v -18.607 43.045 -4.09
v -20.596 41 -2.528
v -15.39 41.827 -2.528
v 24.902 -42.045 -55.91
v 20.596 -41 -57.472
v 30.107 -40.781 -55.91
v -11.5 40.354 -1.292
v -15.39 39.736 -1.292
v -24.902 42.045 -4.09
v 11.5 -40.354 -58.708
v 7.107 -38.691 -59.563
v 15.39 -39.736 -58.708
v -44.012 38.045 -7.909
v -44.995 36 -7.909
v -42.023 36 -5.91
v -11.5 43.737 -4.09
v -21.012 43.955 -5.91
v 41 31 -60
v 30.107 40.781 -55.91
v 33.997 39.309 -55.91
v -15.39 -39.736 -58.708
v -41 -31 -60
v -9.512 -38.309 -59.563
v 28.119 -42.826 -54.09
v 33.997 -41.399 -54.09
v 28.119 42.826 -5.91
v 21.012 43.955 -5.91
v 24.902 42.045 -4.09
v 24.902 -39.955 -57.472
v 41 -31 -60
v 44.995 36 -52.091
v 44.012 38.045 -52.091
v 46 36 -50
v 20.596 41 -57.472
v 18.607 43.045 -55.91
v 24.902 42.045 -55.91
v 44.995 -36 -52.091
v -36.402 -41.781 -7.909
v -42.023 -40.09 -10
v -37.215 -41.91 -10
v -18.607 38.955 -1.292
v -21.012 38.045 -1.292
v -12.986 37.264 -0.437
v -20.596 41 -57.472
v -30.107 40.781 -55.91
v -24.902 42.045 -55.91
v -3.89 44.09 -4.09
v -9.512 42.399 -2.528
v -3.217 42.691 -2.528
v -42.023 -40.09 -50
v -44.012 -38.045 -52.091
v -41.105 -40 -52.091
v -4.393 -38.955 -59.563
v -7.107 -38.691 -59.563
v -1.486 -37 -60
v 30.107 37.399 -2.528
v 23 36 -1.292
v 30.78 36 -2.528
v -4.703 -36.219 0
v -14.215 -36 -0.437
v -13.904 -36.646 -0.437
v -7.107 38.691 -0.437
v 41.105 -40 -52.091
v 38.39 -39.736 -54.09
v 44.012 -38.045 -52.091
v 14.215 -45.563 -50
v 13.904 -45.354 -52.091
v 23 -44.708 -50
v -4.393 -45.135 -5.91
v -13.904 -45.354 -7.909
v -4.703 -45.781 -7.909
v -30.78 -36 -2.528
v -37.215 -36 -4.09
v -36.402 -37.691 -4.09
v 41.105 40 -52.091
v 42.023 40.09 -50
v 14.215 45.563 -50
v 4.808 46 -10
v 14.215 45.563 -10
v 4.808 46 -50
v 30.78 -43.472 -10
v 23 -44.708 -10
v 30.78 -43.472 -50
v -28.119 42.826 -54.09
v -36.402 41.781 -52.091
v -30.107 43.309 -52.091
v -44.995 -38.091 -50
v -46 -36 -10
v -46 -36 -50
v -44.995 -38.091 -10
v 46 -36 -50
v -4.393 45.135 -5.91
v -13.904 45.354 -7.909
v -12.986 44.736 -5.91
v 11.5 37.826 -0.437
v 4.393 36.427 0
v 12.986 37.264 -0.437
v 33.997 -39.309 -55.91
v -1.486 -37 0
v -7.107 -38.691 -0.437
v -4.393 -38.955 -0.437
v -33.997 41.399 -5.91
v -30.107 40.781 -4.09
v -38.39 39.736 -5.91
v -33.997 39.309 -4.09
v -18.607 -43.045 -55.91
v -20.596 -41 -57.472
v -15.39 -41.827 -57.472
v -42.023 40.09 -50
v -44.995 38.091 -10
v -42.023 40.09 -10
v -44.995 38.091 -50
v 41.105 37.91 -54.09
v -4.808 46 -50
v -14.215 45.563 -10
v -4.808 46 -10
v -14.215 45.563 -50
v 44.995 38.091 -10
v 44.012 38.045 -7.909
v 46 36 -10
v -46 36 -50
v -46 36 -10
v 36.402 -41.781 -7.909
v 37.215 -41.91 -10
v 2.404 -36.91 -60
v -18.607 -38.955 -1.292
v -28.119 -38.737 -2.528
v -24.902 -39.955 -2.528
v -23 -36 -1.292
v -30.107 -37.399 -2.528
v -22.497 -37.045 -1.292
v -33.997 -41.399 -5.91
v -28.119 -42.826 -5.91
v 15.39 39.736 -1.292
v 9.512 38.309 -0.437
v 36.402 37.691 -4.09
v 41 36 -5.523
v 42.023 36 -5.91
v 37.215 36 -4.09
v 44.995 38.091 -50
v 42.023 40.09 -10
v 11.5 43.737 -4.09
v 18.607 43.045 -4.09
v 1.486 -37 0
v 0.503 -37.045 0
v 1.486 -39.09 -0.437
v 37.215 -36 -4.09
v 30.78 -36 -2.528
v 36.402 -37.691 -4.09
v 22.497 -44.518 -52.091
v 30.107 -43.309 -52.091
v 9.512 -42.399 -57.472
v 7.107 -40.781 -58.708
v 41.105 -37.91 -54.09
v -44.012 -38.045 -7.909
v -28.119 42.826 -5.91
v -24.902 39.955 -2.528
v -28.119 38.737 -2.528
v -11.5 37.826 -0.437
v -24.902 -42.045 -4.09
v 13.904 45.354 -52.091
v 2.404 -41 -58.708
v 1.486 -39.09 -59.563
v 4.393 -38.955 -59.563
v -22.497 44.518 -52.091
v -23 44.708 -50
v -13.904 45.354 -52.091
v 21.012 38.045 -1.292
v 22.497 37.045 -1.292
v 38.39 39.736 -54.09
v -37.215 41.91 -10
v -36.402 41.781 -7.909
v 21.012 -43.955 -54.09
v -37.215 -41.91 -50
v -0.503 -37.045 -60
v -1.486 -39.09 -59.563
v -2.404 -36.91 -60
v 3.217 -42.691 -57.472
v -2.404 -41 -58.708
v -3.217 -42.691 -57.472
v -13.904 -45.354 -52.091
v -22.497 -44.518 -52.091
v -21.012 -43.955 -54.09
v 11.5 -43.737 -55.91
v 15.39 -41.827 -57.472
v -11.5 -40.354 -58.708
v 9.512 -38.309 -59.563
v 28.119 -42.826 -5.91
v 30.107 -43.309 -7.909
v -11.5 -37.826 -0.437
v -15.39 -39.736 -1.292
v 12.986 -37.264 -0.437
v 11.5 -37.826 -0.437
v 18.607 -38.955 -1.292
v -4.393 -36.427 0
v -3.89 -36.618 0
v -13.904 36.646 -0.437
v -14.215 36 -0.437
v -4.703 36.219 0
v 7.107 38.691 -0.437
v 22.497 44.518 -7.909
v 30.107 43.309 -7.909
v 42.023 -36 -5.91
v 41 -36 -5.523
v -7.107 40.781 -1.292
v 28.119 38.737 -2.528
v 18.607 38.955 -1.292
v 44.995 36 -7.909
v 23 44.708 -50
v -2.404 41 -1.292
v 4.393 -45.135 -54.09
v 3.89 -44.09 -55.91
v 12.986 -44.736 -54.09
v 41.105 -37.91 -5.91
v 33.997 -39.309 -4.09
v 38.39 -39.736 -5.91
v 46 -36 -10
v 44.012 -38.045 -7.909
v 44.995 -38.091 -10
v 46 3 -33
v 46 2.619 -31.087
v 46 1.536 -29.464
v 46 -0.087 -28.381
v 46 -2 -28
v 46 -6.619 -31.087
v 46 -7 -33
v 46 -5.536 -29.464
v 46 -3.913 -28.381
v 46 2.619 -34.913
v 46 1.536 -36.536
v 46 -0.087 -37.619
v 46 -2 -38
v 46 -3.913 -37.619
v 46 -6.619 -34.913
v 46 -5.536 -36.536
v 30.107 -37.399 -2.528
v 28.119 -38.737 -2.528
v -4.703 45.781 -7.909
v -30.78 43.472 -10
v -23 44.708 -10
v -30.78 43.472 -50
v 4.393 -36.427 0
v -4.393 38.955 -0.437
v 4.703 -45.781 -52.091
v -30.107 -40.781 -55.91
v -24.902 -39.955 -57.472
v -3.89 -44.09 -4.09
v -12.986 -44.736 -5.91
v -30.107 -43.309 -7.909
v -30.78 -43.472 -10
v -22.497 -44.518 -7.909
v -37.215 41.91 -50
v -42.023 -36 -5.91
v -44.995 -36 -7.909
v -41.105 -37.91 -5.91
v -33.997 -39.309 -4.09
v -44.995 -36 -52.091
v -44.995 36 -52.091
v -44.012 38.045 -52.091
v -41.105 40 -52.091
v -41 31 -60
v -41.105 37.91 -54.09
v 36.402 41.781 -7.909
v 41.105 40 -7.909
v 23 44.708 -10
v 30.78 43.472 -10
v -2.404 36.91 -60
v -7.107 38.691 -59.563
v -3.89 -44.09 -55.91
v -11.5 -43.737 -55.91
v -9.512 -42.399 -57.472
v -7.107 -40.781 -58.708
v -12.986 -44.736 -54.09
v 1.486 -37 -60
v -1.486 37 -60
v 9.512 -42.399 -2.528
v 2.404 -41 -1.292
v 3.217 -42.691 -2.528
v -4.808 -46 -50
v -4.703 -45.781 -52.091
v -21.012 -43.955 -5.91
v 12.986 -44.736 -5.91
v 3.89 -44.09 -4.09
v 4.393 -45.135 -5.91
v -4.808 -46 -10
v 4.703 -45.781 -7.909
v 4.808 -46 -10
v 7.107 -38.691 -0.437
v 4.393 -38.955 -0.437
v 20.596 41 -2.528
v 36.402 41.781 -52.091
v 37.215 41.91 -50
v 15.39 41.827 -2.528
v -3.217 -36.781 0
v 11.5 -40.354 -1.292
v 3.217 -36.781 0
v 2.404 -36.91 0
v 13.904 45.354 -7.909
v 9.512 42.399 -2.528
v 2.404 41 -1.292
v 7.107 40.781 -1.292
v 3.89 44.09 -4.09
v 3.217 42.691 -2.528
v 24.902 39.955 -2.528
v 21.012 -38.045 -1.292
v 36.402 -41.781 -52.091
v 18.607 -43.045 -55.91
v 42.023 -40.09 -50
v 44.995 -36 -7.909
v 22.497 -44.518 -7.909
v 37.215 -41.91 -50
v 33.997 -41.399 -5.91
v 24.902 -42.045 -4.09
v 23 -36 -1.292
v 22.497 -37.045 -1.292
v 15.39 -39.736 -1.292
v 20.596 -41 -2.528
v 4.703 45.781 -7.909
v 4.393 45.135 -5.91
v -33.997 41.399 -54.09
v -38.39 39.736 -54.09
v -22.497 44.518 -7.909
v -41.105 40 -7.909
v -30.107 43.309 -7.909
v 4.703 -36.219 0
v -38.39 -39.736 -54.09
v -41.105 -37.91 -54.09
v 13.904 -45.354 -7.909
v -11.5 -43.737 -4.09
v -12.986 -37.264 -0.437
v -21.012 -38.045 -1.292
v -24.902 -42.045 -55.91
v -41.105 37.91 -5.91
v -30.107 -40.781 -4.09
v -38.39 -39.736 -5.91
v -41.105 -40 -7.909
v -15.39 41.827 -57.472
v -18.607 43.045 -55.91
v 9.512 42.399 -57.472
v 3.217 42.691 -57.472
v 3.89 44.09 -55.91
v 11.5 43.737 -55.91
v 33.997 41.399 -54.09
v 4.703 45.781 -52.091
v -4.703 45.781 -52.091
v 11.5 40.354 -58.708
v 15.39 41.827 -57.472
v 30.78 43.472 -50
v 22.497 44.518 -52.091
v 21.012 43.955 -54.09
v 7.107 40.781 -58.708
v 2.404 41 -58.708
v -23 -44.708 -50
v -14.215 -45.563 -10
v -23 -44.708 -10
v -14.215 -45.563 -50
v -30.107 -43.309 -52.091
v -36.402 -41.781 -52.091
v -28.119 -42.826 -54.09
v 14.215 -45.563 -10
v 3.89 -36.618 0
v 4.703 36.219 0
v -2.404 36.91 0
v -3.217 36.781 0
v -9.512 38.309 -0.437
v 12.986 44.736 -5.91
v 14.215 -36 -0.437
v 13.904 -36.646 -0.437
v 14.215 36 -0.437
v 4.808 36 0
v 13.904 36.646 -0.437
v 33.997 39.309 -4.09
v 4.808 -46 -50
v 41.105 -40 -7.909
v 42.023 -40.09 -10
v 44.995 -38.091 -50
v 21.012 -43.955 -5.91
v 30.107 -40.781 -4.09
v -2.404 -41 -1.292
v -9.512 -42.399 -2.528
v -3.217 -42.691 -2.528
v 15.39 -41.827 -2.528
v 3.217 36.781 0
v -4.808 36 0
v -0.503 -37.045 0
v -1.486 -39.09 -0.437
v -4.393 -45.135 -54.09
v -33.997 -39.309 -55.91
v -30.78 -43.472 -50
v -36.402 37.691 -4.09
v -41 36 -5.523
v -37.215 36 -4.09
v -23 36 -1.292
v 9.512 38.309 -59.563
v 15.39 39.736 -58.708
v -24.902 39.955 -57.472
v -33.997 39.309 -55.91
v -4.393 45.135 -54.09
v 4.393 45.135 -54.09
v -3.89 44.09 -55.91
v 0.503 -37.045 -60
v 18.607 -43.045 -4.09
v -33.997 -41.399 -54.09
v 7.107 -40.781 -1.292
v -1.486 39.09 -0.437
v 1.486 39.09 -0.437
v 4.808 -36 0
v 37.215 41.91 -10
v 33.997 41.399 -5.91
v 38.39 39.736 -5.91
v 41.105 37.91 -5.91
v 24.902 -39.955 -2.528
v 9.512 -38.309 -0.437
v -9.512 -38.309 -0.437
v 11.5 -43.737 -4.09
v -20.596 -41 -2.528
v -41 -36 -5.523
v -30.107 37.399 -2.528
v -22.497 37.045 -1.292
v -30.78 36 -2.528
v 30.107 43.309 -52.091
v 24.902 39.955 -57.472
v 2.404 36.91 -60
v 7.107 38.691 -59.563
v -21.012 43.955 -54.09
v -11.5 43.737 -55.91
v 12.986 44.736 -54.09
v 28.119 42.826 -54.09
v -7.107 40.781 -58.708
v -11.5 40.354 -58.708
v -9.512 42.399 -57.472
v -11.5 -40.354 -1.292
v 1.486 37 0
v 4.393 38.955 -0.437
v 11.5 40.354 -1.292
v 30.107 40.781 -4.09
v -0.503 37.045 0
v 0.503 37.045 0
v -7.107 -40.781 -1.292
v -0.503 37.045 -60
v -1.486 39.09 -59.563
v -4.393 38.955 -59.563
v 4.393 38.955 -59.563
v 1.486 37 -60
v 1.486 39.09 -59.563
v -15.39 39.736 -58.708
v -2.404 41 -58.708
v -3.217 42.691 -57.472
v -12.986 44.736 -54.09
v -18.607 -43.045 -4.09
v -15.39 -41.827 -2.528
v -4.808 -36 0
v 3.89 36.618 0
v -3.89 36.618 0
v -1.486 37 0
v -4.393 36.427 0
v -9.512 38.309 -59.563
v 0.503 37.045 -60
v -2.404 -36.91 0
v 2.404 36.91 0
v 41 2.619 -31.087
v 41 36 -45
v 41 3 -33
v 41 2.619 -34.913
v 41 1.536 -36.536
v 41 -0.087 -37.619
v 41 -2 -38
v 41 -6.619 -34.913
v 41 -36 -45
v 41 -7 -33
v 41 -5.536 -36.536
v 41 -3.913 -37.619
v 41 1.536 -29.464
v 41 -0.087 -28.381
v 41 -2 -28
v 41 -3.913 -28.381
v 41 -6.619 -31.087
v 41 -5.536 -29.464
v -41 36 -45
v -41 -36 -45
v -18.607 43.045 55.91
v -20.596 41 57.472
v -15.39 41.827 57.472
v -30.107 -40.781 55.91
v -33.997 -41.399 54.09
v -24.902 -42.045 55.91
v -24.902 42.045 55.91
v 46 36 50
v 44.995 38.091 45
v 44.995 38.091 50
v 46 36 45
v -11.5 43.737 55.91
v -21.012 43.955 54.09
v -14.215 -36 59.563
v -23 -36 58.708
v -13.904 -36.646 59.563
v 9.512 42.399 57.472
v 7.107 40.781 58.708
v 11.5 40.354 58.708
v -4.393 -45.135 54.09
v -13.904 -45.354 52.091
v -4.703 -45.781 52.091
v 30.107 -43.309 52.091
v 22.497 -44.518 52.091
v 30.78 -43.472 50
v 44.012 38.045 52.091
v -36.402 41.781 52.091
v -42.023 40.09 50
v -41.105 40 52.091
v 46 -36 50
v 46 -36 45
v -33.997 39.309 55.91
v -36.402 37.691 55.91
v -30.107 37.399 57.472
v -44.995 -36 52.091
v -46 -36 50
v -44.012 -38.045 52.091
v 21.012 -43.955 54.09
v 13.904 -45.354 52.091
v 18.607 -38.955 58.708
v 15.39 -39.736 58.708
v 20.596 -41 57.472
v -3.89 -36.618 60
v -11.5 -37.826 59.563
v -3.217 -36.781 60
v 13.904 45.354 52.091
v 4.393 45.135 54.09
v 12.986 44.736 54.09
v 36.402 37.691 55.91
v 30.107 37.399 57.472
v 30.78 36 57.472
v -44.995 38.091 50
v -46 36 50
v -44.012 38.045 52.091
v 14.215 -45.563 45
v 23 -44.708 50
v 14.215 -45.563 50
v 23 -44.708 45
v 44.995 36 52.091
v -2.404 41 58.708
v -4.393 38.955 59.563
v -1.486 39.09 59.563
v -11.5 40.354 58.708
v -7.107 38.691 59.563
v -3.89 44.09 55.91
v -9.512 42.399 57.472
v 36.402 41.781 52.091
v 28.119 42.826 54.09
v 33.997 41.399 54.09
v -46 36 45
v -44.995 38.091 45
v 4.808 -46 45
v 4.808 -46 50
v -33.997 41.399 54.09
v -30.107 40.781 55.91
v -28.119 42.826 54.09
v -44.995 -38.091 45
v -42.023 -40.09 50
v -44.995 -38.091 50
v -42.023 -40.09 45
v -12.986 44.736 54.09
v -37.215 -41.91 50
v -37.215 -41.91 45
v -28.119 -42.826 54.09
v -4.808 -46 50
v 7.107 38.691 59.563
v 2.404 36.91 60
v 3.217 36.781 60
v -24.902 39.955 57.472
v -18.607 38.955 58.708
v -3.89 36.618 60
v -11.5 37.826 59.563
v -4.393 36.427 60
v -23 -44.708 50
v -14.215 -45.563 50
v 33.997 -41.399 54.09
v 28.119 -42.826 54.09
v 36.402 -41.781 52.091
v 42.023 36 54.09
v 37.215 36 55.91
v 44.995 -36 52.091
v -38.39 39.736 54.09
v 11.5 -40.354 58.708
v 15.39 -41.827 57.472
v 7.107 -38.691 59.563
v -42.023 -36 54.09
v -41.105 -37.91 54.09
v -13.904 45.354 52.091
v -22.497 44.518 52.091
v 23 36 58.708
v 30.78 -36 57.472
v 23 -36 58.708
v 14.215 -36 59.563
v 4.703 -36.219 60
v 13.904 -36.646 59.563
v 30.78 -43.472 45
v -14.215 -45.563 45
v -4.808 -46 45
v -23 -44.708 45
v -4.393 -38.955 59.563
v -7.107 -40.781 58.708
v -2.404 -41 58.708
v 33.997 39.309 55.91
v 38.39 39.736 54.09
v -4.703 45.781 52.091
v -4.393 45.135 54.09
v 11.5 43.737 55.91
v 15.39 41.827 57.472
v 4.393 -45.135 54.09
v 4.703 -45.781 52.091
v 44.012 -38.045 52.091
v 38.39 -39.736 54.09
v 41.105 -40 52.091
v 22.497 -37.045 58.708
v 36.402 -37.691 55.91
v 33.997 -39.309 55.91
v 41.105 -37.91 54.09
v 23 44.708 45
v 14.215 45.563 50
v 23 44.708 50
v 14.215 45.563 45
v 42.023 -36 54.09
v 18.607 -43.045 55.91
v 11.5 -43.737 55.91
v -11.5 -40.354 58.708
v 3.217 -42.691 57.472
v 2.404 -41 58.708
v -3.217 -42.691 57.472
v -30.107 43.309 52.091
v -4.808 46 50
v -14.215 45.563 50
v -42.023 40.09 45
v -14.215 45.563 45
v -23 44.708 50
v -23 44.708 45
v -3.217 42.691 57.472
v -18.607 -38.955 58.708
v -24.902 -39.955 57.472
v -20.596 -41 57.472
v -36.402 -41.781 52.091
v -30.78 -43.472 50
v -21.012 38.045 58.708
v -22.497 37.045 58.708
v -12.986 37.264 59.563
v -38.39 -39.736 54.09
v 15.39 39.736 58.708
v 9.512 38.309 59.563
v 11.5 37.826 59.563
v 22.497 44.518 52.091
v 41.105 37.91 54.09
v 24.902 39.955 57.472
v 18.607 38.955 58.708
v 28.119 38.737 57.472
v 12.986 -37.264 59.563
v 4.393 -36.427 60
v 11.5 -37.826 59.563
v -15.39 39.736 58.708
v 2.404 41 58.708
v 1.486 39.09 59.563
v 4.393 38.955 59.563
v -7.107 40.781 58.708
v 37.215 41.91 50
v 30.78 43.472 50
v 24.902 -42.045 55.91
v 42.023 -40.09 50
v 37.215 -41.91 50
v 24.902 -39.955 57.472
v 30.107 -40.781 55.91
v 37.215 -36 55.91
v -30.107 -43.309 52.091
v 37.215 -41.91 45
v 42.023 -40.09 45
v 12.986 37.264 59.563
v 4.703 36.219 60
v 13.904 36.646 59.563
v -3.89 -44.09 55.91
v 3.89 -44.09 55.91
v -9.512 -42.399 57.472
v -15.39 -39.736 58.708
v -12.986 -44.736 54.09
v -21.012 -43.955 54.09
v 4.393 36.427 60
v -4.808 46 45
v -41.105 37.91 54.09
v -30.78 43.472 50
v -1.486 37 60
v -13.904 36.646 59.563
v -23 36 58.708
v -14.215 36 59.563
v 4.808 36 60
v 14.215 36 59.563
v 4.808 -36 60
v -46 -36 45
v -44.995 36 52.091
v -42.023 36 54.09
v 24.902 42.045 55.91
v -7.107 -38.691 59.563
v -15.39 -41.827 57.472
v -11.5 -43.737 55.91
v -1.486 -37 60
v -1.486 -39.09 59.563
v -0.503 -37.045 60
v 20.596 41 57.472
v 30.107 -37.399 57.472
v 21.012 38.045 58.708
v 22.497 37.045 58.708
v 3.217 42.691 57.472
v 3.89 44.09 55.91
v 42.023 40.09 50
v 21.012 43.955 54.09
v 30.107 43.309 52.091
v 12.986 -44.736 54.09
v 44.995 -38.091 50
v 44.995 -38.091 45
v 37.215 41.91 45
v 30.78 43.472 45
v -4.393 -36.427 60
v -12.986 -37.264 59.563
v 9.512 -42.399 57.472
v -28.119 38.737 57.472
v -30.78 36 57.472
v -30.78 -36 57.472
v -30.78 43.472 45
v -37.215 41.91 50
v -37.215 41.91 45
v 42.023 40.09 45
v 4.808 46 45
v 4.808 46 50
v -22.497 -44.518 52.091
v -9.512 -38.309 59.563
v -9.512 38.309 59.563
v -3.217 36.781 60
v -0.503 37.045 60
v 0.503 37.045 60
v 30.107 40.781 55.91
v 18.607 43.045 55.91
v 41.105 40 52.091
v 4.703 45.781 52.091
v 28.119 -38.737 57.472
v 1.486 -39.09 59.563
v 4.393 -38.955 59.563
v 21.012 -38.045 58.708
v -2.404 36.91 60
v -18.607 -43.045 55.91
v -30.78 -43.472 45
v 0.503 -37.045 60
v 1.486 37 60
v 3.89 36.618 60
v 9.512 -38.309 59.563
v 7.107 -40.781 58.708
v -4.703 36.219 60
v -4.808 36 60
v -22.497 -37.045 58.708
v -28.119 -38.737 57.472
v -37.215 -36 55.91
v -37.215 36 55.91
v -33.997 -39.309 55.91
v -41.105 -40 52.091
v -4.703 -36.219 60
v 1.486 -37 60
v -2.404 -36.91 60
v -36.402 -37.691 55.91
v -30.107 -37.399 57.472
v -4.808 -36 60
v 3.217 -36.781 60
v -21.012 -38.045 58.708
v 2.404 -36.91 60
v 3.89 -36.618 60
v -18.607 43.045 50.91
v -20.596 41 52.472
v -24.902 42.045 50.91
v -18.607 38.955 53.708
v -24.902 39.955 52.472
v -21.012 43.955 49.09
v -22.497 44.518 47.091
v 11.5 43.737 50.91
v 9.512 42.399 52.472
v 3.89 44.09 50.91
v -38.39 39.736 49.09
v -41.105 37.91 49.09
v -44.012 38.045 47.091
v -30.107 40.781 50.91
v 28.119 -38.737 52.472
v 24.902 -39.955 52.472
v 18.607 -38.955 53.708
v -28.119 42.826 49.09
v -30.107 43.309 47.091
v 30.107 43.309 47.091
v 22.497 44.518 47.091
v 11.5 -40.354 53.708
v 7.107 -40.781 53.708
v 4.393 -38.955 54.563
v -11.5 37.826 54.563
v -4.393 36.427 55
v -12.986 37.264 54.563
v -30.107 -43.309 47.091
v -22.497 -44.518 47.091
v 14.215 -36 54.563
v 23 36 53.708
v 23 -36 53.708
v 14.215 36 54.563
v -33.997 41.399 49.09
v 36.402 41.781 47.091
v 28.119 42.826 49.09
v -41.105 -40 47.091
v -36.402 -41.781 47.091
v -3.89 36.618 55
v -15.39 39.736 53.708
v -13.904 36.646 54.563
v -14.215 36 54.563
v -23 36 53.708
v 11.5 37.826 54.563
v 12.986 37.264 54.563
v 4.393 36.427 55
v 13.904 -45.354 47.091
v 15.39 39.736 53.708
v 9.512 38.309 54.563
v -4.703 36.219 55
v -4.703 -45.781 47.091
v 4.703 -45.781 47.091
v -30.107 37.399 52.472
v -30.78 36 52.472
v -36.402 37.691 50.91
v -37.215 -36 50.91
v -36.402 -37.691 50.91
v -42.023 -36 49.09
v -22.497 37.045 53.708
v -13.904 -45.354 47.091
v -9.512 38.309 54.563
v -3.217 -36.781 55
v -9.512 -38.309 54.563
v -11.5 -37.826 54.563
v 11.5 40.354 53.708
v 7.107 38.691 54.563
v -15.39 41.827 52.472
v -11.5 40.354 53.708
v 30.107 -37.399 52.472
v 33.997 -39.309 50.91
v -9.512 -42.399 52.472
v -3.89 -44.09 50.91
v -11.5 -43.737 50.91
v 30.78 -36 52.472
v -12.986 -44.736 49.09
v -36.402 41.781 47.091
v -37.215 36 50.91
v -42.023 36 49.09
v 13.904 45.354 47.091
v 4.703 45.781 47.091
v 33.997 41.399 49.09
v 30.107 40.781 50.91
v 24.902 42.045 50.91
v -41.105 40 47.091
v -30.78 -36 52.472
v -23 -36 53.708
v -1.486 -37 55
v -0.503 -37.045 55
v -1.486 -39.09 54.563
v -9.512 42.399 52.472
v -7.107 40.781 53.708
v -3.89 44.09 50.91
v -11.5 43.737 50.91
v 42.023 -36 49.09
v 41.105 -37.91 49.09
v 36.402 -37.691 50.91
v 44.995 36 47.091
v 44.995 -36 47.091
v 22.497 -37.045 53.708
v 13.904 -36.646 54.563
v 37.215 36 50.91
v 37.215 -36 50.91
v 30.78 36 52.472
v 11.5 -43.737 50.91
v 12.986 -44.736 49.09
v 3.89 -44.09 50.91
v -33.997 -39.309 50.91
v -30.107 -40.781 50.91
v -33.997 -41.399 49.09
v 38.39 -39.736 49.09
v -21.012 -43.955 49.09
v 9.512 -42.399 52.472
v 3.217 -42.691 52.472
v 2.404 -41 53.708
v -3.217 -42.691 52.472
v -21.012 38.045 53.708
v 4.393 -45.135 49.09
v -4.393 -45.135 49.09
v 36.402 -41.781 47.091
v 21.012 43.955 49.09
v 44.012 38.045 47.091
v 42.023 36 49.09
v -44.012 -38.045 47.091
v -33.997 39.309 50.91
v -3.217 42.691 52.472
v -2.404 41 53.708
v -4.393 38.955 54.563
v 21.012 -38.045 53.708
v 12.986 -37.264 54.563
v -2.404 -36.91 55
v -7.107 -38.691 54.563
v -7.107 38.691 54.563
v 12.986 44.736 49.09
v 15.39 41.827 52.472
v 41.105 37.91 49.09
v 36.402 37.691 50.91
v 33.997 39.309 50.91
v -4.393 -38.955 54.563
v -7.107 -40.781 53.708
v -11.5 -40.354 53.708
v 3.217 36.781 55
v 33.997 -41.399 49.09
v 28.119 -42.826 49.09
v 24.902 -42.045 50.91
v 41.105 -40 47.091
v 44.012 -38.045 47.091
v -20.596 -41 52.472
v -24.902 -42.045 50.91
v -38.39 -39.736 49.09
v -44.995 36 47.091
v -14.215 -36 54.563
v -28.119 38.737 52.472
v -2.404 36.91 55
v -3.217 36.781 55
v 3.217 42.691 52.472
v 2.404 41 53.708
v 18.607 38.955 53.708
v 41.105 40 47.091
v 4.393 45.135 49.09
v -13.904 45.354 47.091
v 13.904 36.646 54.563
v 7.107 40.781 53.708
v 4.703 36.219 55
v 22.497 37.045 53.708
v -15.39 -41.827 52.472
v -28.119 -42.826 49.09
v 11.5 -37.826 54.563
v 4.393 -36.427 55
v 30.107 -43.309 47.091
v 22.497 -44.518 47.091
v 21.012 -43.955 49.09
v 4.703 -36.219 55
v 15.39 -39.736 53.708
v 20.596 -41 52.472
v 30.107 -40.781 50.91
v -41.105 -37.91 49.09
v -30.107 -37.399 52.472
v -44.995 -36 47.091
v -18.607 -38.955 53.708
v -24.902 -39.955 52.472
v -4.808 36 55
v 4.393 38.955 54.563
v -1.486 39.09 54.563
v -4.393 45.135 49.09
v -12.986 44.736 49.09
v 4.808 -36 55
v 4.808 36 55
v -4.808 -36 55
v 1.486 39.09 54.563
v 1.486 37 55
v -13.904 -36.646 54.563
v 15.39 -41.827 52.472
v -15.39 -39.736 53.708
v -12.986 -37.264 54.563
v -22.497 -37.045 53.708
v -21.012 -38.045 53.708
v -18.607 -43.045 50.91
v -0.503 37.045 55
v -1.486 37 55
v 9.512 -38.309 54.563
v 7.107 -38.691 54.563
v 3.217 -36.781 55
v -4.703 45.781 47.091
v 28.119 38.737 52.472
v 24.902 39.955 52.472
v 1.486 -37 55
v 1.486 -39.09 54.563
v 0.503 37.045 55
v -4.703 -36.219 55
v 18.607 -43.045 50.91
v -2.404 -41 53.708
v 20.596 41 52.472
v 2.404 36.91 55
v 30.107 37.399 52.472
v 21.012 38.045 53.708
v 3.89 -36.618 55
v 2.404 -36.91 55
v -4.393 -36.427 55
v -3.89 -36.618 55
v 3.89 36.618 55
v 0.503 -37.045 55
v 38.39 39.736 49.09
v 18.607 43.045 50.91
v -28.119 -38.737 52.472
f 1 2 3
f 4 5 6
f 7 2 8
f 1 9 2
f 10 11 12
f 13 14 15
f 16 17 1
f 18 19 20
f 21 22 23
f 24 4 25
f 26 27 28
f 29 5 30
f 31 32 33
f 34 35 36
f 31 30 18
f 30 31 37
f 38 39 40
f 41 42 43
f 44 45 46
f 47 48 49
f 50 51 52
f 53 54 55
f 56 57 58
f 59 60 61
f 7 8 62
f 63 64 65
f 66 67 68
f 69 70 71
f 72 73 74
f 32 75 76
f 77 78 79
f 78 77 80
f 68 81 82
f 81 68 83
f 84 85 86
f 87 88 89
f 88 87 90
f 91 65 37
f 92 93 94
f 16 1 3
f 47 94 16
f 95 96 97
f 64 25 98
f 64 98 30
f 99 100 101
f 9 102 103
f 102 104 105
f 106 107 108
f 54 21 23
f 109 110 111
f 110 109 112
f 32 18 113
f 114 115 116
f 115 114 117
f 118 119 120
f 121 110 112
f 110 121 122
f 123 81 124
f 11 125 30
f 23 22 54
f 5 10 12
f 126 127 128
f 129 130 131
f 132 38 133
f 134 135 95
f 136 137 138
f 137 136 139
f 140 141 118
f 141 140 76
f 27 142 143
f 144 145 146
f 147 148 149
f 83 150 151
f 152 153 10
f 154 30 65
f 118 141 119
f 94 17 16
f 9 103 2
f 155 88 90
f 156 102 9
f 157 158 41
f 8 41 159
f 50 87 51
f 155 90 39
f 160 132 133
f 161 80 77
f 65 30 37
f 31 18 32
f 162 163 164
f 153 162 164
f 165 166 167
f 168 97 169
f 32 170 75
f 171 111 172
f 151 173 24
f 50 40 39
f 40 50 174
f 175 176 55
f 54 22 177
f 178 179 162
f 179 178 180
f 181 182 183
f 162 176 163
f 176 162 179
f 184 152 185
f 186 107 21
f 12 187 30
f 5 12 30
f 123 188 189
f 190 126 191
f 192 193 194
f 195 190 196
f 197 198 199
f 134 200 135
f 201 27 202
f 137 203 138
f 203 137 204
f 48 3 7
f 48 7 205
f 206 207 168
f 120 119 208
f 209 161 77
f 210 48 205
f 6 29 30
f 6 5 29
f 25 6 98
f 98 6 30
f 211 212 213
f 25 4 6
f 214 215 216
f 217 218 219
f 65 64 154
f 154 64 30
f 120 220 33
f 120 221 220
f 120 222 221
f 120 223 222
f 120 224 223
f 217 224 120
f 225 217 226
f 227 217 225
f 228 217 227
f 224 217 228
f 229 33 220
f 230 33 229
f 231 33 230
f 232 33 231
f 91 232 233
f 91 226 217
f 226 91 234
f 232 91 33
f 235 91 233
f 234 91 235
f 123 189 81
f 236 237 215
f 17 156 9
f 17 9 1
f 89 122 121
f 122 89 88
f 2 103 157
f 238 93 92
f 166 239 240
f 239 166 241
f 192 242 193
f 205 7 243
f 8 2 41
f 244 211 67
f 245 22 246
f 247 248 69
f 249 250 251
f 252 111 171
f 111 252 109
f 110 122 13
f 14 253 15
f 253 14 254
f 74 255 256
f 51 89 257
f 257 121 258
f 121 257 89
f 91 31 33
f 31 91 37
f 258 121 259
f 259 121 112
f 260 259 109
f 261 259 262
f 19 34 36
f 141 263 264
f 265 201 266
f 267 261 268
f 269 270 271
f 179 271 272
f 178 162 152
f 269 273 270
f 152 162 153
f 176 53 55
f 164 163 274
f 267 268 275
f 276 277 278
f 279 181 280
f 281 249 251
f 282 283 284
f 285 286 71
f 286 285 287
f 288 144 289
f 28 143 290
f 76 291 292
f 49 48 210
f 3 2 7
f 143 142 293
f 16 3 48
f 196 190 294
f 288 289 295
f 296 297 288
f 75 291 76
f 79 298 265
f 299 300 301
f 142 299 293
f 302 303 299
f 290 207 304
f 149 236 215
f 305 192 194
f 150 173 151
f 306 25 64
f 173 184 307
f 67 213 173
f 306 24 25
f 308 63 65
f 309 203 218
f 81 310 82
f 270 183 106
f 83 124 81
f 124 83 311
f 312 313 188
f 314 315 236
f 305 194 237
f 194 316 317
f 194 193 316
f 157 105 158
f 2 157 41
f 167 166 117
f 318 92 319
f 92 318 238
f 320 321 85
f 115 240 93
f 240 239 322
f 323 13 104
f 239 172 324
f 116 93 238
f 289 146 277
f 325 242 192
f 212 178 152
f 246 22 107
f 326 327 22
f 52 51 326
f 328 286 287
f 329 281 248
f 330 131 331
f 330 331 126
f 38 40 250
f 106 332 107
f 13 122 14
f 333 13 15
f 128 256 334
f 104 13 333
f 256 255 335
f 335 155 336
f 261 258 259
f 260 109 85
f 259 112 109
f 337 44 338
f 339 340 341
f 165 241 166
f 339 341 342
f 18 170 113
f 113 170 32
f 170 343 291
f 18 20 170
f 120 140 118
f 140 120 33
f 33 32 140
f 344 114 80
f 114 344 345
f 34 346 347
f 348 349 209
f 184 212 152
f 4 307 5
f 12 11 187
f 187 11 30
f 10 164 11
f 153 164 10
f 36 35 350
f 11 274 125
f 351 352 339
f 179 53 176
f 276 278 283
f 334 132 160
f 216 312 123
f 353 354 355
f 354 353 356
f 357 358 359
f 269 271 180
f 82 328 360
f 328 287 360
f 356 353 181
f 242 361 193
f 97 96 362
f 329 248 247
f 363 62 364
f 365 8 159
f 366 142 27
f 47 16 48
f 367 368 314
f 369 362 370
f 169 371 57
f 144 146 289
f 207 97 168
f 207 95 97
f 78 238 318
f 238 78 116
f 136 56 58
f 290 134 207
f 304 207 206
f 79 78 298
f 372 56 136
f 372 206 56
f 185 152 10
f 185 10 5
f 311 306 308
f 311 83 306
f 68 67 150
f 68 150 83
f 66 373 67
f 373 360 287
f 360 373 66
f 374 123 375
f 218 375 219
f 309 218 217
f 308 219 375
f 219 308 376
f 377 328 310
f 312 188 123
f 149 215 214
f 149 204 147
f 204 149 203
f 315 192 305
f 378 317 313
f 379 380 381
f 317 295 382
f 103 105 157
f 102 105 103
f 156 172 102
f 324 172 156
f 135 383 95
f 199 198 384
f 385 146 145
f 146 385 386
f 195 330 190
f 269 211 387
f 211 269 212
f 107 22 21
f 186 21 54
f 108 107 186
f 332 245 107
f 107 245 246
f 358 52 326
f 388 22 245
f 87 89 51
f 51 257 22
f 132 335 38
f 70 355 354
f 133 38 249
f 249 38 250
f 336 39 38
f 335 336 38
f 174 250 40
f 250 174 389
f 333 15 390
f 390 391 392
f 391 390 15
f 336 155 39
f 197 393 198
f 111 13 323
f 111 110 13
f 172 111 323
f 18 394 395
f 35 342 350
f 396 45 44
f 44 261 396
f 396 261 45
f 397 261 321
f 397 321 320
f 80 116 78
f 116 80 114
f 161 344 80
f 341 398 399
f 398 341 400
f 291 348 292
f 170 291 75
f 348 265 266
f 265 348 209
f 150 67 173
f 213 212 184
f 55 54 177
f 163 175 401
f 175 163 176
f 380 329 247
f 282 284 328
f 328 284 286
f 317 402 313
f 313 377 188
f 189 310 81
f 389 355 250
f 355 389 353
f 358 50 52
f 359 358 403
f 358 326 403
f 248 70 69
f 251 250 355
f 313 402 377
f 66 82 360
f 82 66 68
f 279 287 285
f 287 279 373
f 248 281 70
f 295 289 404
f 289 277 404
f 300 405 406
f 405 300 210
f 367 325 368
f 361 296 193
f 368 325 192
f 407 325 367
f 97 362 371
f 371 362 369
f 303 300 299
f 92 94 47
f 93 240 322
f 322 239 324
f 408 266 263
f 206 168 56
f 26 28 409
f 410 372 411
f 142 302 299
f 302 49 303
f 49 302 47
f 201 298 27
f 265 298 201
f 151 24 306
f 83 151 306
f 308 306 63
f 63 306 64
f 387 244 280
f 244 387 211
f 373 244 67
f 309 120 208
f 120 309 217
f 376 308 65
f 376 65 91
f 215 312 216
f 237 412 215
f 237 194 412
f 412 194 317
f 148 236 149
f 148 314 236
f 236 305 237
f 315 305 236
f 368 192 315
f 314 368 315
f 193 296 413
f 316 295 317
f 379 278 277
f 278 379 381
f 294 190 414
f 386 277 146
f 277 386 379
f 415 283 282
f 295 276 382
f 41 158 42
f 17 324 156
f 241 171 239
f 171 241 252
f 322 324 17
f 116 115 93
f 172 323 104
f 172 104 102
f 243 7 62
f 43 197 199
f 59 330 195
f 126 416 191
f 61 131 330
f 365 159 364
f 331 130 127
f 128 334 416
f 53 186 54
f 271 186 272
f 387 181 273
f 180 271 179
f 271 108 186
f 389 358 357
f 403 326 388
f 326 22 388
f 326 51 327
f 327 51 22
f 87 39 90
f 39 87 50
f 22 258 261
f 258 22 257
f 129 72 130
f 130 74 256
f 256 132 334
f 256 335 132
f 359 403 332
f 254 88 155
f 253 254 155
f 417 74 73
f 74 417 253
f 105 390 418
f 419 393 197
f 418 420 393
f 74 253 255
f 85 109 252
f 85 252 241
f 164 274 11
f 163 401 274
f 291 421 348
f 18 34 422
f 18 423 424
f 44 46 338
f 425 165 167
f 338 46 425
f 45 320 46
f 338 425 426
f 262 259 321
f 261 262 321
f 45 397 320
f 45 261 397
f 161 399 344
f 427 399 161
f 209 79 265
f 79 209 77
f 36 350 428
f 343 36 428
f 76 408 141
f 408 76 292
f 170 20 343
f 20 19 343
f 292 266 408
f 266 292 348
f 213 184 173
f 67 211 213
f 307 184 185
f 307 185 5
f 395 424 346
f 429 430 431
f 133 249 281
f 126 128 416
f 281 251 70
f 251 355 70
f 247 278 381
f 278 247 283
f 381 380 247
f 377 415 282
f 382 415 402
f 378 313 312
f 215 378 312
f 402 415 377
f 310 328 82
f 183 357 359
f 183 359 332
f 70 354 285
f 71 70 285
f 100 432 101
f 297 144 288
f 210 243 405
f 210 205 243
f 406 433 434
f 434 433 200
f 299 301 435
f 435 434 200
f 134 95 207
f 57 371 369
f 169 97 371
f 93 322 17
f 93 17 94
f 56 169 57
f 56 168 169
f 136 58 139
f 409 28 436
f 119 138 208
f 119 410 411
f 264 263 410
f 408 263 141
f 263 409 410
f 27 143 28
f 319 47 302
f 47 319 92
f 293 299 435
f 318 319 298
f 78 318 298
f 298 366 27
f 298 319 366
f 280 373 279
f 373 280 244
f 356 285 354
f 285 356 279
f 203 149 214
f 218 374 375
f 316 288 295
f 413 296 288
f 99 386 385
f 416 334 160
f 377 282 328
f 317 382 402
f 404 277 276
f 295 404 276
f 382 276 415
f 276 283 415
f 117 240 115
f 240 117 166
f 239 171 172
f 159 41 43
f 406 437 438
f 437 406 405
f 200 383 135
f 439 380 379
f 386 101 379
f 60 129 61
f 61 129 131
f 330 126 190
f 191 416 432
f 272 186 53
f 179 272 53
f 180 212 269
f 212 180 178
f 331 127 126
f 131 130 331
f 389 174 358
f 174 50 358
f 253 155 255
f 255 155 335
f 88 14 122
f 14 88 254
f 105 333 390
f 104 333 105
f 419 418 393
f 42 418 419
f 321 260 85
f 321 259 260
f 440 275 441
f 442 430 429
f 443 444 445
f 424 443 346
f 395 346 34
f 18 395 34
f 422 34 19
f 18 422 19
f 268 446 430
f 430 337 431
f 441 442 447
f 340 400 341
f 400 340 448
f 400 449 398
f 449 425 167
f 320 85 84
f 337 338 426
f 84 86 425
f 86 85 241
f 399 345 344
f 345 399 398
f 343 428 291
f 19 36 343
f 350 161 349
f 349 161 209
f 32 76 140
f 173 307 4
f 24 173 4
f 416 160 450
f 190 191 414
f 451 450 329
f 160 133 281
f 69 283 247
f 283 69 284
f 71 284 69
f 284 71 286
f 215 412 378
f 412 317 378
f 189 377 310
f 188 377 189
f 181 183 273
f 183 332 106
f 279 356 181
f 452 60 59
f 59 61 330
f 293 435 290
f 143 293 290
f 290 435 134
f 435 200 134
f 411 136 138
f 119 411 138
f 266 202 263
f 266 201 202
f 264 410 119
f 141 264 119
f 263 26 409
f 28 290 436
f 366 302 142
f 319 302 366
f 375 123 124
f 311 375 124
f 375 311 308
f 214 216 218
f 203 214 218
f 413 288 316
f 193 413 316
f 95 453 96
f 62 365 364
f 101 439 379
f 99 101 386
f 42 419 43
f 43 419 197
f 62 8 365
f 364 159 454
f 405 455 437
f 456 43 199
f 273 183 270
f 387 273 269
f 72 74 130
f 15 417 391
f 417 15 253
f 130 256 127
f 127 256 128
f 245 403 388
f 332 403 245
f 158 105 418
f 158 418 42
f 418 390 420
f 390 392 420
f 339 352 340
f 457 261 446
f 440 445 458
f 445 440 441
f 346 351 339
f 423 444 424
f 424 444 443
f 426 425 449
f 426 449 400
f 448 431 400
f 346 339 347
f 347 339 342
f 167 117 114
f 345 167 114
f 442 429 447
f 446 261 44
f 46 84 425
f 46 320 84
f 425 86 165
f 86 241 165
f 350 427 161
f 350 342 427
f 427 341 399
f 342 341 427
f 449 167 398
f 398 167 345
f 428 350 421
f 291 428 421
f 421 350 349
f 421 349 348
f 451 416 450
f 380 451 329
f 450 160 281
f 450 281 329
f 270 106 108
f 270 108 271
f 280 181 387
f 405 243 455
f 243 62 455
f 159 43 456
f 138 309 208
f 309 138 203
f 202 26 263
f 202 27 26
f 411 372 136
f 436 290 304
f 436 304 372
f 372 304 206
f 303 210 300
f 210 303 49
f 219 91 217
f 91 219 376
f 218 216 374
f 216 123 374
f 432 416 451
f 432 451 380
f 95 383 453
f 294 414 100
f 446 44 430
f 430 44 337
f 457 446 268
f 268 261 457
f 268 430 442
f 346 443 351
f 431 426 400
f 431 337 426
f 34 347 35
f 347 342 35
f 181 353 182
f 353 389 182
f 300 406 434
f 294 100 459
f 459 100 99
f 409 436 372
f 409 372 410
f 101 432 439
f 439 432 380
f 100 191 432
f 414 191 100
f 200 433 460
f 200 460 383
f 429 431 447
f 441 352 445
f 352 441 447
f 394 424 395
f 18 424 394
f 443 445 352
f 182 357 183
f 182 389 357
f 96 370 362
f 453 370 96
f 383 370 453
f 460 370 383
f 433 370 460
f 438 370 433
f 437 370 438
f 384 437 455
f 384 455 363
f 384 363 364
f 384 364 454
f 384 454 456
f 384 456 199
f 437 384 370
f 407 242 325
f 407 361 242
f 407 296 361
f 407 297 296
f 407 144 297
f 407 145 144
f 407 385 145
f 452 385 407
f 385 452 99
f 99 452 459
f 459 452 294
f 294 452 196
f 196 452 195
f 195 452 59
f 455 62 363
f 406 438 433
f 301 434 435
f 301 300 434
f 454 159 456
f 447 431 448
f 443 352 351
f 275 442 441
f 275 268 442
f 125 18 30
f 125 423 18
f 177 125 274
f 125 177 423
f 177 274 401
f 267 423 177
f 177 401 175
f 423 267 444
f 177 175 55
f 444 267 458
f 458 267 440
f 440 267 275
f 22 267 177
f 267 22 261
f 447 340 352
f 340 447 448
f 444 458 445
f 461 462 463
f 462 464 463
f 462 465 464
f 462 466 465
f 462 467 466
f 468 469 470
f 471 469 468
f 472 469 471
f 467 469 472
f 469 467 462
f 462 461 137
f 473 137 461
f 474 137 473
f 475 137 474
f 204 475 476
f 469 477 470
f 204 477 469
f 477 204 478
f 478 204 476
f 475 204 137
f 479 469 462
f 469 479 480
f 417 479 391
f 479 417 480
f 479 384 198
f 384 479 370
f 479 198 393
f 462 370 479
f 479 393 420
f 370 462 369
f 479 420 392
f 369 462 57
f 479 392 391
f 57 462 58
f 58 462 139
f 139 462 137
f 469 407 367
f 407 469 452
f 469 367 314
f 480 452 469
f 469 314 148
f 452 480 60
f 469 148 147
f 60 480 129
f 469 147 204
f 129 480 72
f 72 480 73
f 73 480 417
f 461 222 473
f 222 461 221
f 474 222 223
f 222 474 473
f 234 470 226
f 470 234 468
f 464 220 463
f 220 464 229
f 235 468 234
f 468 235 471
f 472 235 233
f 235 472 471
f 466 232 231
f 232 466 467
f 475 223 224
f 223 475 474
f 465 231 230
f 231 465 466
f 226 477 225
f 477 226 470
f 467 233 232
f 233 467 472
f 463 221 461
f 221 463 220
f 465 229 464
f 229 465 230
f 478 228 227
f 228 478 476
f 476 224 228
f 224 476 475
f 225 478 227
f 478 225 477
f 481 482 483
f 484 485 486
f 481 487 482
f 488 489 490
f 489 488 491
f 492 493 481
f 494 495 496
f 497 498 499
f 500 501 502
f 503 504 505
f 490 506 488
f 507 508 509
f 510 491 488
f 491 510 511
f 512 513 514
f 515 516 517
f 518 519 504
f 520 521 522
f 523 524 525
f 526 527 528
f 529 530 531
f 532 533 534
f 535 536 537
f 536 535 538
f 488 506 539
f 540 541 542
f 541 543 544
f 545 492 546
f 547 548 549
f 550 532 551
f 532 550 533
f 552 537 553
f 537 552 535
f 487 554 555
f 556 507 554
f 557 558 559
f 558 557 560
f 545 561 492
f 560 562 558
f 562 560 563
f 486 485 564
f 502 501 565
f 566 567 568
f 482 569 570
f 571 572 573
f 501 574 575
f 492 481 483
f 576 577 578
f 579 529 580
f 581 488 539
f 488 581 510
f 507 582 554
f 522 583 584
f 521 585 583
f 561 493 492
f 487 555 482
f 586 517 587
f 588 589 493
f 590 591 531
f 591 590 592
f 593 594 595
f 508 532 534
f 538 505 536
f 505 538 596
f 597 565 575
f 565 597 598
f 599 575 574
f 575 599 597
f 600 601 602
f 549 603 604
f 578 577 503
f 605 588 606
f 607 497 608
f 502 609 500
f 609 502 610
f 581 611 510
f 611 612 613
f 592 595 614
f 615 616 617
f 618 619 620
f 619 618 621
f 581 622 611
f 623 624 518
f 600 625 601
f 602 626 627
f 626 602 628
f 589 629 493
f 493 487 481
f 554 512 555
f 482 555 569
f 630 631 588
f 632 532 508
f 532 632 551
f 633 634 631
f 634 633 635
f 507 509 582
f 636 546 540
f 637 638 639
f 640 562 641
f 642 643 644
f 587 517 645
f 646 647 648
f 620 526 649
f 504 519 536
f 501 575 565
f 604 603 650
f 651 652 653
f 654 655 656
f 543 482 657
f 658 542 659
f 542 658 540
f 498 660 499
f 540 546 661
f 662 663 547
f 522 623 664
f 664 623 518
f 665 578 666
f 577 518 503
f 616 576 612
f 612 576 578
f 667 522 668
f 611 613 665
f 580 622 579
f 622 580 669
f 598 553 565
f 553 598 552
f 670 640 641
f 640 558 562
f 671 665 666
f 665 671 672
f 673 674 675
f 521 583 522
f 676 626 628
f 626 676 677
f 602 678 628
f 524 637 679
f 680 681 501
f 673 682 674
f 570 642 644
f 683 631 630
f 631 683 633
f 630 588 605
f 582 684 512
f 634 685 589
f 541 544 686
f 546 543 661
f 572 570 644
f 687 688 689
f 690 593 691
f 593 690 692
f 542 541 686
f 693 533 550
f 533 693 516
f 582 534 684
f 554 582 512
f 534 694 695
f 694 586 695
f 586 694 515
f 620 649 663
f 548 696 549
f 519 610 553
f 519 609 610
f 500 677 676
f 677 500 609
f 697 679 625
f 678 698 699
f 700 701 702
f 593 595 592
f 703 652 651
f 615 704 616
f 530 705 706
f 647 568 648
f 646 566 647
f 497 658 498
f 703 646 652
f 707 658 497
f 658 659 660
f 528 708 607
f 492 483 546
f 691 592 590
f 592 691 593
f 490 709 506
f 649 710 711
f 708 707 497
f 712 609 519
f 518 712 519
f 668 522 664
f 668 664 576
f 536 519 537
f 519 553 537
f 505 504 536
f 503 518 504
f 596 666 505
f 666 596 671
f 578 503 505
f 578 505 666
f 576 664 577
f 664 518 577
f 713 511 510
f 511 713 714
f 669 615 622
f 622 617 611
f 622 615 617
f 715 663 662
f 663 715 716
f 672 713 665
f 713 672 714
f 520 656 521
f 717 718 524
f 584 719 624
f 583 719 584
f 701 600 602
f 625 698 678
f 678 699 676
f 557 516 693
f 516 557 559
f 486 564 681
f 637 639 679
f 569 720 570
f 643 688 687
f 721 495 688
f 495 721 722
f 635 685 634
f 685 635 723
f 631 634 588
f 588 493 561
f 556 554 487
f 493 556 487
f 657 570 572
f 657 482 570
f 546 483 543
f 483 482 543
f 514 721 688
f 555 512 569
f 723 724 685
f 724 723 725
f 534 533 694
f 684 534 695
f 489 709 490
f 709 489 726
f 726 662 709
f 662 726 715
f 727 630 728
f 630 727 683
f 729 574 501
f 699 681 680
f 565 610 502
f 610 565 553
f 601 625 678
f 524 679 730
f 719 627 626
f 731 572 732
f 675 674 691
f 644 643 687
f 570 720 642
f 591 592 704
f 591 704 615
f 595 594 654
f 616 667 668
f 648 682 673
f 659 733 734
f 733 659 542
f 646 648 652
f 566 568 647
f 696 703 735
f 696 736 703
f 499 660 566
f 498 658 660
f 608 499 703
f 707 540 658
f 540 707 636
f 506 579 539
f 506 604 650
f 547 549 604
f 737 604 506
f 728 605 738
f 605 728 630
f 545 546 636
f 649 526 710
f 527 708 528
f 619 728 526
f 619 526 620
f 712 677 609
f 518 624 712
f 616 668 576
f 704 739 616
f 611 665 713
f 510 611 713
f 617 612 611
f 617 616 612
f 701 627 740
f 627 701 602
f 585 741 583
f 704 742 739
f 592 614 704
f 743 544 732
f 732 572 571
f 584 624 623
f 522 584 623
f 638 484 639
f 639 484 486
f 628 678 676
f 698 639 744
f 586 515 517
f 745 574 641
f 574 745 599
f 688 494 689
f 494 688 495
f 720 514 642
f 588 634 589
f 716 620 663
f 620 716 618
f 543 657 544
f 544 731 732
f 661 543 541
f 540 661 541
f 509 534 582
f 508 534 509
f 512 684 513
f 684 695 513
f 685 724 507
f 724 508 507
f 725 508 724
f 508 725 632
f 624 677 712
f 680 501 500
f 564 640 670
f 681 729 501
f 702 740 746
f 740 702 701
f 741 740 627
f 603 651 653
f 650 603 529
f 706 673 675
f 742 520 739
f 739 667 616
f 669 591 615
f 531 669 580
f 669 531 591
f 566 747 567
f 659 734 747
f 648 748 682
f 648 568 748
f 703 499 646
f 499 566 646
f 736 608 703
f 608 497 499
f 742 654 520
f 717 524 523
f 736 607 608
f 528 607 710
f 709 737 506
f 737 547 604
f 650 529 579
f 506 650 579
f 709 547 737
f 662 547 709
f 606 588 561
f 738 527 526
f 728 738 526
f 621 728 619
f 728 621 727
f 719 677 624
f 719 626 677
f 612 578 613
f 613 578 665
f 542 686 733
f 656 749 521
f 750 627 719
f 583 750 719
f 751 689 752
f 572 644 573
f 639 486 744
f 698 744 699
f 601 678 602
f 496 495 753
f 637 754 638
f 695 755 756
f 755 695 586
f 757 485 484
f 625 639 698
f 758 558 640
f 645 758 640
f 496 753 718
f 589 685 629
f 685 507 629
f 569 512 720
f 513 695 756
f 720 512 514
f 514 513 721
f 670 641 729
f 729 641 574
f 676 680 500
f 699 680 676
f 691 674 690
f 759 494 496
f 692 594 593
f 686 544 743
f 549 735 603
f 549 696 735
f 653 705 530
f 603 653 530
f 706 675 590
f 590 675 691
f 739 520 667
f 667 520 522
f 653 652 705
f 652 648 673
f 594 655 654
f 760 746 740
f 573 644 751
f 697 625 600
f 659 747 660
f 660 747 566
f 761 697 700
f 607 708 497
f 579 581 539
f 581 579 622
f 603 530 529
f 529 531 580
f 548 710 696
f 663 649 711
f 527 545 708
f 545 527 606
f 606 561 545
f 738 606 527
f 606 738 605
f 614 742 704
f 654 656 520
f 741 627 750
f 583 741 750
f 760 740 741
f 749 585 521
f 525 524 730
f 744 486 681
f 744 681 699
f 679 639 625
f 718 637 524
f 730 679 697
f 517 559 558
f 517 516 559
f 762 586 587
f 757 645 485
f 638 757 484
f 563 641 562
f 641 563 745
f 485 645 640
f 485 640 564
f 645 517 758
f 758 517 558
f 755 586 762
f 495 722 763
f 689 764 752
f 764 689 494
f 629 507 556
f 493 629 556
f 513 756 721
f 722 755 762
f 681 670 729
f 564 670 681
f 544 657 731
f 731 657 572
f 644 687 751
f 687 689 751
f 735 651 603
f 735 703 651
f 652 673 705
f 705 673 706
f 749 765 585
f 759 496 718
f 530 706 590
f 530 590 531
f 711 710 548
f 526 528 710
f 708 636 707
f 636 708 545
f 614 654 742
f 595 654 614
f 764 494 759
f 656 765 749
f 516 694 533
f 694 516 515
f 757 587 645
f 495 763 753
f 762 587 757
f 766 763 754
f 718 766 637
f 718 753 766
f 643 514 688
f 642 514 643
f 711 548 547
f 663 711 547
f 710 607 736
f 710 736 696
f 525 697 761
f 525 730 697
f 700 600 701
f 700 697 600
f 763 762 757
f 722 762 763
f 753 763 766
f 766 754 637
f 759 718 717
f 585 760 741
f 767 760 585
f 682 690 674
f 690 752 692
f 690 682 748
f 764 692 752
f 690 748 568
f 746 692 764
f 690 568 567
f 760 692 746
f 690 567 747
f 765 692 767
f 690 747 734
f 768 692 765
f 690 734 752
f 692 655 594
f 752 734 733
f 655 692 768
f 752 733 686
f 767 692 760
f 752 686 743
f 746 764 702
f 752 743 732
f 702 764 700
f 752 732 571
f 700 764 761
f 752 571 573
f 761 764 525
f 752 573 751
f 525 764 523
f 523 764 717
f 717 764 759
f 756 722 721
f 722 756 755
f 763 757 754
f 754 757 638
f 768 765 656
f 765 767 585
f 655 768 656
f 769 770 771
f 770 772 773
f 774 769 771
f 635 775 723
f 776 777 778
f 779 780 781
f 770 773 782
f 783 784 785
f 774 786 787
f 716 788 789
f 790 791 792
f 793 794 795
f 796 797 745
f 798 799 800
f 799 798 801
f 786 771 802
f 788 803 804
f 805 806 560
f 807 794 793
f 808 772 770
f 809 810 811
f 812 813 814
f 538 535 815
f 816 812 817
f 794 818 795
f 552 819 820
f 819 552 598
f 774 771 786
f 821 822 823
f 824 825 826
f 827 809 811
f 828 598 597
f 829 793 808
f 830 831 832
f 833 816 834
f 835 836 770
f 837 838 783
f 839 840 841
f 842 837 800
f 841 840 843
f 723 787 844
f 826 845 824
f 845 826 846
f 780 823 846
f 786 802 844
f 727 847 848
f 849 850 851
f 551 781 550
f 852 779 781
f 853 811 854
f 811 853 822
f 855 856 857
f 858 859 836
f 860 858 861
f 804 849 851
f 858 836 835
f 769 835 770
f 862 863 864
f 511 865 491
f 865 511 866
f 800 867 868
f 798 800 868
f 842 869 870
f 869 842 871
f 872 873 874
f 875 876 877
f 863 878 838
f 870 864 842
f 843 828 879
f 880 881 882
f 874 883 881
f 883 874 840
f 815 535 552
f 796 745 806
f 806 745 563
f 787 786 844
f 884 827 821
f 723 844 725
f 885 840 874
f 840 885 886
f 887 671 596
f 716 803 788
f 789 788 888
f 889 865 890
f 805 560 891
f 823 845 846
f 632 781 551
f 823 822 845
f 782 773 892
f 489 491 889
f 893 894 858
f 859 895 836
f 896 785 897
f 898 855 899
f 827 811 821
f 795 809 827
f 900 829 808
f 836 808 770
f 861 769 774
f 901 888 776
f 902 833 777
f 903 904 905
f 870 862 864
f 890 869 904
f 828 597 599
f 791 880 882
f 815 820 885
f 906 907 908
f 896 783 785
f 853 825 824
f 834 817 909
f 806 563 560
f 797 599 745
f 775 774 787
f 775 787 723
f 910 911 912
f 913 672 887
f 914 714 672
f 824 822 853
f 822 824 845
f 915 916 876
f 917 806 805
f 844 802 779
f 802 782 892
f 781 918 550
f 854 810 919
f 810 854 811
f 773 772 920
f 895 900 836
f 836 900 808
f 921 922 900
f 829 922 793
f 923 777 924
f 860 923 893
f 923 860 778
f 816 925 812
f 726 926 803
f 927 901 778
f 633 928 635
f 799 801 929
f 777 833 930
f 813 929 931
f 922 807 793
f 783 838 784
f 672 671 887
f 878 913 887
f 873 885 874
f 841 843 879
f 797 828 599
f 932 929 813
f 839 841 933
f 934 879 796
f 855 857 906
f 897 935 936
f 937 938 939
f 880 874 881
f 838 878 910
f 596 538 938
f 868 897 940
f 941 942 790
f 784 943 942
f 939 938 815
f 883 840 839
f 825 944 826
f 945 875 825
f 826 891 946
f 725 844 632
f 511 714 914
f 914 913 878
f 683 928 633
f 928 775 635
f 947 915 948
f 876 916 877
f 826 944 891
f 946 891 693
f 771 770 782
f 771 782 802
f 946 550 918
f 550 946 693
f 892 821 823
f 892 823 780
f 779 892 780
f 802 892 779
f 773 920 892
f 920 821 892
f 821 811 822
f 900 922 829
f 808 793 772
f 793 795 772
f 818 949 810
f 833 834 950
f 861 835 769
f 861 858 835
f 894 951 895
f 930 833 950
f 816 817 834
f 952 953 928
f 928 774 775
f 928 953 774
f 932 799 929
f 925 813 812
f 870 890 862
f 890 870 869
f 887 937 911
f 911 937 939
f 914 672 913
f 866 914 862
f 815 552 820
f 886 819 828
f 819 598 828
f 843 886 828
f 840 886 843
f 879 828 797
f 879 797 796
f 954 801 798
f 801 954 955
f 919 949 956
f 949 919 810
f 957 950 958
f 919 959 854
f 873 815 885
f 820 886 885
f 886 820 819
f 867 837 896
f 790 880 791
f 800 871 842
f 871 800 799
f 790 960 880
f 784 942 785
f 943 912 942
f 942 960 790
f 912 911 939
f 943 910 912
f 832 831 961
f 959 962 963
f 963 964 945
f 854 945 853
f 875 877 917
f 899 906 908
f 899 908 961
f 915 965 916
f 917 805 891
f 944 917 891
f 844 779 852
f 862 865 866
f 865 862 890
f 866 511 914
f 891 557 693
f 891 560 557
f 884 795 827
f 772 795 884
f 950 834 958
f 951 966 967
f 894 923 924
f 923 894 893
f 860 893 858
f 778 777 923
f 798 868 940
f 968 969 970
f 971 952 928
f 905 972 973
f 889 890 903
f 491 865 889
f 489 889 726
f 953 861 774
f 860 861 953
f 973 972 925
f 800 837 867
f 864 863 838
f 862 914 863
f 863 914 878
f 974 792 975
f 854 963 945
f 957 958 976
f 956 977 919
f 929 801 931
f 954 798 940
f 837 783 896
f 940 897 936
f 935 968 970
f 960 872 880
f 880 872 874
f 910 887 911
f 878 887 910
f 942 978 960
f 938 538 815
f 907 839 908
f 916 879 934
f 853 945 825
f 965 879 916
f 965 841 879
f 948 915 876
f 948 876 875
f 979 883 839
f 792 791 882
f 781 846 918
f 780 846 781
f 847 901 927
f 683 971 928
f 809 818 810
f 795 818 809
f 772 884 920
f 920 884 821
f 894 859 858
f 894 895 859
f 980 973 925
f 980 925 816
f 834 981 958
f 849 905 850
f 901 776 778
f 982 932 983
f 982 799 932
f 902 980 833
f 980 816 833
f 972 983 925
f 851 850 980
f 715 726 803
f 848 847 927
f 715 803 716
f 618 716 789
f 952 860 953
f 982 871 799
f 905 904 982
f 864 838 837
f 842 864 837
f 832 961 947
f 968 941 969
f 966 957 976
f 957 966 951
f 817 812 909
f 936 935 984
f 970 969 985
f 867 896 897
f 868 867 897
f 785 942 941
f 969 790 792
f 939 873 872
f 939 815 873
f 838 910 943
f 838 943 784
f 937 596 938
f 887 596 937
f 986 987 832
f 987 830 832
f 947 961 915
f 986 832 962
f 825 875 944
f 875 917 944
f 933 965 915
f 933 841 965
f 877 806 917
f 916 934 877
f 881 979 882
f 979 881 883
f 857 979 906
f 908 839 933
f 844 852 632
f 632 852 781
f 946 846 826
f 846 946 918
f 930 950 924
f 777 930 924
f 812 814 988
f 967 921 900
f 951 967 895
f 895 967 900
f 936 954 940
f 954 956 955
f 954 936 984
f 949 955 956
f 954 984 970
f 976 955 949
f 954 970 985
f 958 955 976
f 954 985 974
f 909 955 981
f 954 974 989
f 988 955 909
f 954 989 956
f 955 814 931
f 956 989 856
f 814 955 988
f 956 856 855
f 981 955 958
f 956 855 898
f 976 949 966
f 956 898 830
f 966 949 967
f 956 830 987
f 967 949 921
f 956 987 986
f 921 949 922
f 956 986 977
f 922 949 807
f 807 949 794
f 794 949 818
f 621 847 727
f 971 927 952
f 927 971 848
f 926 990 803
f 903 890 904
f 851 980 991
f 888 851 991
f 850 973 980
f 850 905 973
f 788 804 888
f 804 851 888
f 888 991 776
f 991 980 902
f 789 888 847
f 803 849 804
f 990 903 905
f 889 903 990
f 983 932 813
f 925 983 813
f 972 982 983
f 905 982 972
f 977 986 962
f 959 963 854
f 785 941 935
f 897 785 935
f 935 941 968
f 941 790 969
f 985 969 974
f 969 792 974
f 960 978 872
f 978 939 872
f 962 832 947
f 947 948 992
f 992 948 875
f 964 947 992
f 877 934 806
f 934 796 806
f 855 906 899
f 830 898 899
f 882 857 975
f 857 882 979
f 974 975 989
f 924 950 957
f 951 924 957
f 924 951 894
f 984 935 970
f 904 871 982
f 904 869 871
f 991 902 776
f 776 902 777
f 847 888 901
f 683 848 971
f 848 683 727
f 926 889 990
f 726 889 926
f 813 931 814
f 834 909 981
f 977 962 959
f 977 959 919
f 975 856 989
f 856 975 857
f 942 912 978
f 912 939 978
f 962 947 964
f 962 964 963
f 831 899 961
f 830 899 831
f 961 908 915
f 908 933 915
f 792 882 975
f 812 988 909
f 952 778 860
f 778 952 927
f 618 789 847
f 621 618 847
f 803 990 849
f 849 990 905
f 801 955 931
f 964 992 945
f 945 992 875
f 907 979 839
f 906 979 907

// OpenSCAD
module body(w,l,h) {
    difference() {
        hull() {
            for(y = [h/2,-h/2])
                for(x = [l/2, -l/2])
                    translate([0,x,y])resize(newsize = [w,                20,20])sphere(r=10);
            translate([0,0,-h/2-5])cube([w-10,l-10,10],center=        true);
        }
        translate([0,0,10])cube([w-10,l,h+10],center=true);
         translate([30,-2,-3])rotate([0,90,0])cylinder(h=20,r1=5,r2=5);
    }
}

module cap(w,l,h) {
    difference() {
        hull() {
            for(y = [h/2,-h/2])
                for(x = [l/2, -l/2])
                    translate([0,x,y])resize(newsize = [w,                20,20])sphere(r=10);
        }
        hull() {
            for(y = [h/2,-h/2])
                for(x = [l/2, -l/2])
                    translate([0,x,y-5])resize(newsize = [w,                20,20])sphere(r=10);
        }
        translate([0,0,-10])cube([120,100,50],center=true);
    }  
}

translate([0,0,-30])body(92,72,40);
translate([0,0,30])cap(92,72,40);
